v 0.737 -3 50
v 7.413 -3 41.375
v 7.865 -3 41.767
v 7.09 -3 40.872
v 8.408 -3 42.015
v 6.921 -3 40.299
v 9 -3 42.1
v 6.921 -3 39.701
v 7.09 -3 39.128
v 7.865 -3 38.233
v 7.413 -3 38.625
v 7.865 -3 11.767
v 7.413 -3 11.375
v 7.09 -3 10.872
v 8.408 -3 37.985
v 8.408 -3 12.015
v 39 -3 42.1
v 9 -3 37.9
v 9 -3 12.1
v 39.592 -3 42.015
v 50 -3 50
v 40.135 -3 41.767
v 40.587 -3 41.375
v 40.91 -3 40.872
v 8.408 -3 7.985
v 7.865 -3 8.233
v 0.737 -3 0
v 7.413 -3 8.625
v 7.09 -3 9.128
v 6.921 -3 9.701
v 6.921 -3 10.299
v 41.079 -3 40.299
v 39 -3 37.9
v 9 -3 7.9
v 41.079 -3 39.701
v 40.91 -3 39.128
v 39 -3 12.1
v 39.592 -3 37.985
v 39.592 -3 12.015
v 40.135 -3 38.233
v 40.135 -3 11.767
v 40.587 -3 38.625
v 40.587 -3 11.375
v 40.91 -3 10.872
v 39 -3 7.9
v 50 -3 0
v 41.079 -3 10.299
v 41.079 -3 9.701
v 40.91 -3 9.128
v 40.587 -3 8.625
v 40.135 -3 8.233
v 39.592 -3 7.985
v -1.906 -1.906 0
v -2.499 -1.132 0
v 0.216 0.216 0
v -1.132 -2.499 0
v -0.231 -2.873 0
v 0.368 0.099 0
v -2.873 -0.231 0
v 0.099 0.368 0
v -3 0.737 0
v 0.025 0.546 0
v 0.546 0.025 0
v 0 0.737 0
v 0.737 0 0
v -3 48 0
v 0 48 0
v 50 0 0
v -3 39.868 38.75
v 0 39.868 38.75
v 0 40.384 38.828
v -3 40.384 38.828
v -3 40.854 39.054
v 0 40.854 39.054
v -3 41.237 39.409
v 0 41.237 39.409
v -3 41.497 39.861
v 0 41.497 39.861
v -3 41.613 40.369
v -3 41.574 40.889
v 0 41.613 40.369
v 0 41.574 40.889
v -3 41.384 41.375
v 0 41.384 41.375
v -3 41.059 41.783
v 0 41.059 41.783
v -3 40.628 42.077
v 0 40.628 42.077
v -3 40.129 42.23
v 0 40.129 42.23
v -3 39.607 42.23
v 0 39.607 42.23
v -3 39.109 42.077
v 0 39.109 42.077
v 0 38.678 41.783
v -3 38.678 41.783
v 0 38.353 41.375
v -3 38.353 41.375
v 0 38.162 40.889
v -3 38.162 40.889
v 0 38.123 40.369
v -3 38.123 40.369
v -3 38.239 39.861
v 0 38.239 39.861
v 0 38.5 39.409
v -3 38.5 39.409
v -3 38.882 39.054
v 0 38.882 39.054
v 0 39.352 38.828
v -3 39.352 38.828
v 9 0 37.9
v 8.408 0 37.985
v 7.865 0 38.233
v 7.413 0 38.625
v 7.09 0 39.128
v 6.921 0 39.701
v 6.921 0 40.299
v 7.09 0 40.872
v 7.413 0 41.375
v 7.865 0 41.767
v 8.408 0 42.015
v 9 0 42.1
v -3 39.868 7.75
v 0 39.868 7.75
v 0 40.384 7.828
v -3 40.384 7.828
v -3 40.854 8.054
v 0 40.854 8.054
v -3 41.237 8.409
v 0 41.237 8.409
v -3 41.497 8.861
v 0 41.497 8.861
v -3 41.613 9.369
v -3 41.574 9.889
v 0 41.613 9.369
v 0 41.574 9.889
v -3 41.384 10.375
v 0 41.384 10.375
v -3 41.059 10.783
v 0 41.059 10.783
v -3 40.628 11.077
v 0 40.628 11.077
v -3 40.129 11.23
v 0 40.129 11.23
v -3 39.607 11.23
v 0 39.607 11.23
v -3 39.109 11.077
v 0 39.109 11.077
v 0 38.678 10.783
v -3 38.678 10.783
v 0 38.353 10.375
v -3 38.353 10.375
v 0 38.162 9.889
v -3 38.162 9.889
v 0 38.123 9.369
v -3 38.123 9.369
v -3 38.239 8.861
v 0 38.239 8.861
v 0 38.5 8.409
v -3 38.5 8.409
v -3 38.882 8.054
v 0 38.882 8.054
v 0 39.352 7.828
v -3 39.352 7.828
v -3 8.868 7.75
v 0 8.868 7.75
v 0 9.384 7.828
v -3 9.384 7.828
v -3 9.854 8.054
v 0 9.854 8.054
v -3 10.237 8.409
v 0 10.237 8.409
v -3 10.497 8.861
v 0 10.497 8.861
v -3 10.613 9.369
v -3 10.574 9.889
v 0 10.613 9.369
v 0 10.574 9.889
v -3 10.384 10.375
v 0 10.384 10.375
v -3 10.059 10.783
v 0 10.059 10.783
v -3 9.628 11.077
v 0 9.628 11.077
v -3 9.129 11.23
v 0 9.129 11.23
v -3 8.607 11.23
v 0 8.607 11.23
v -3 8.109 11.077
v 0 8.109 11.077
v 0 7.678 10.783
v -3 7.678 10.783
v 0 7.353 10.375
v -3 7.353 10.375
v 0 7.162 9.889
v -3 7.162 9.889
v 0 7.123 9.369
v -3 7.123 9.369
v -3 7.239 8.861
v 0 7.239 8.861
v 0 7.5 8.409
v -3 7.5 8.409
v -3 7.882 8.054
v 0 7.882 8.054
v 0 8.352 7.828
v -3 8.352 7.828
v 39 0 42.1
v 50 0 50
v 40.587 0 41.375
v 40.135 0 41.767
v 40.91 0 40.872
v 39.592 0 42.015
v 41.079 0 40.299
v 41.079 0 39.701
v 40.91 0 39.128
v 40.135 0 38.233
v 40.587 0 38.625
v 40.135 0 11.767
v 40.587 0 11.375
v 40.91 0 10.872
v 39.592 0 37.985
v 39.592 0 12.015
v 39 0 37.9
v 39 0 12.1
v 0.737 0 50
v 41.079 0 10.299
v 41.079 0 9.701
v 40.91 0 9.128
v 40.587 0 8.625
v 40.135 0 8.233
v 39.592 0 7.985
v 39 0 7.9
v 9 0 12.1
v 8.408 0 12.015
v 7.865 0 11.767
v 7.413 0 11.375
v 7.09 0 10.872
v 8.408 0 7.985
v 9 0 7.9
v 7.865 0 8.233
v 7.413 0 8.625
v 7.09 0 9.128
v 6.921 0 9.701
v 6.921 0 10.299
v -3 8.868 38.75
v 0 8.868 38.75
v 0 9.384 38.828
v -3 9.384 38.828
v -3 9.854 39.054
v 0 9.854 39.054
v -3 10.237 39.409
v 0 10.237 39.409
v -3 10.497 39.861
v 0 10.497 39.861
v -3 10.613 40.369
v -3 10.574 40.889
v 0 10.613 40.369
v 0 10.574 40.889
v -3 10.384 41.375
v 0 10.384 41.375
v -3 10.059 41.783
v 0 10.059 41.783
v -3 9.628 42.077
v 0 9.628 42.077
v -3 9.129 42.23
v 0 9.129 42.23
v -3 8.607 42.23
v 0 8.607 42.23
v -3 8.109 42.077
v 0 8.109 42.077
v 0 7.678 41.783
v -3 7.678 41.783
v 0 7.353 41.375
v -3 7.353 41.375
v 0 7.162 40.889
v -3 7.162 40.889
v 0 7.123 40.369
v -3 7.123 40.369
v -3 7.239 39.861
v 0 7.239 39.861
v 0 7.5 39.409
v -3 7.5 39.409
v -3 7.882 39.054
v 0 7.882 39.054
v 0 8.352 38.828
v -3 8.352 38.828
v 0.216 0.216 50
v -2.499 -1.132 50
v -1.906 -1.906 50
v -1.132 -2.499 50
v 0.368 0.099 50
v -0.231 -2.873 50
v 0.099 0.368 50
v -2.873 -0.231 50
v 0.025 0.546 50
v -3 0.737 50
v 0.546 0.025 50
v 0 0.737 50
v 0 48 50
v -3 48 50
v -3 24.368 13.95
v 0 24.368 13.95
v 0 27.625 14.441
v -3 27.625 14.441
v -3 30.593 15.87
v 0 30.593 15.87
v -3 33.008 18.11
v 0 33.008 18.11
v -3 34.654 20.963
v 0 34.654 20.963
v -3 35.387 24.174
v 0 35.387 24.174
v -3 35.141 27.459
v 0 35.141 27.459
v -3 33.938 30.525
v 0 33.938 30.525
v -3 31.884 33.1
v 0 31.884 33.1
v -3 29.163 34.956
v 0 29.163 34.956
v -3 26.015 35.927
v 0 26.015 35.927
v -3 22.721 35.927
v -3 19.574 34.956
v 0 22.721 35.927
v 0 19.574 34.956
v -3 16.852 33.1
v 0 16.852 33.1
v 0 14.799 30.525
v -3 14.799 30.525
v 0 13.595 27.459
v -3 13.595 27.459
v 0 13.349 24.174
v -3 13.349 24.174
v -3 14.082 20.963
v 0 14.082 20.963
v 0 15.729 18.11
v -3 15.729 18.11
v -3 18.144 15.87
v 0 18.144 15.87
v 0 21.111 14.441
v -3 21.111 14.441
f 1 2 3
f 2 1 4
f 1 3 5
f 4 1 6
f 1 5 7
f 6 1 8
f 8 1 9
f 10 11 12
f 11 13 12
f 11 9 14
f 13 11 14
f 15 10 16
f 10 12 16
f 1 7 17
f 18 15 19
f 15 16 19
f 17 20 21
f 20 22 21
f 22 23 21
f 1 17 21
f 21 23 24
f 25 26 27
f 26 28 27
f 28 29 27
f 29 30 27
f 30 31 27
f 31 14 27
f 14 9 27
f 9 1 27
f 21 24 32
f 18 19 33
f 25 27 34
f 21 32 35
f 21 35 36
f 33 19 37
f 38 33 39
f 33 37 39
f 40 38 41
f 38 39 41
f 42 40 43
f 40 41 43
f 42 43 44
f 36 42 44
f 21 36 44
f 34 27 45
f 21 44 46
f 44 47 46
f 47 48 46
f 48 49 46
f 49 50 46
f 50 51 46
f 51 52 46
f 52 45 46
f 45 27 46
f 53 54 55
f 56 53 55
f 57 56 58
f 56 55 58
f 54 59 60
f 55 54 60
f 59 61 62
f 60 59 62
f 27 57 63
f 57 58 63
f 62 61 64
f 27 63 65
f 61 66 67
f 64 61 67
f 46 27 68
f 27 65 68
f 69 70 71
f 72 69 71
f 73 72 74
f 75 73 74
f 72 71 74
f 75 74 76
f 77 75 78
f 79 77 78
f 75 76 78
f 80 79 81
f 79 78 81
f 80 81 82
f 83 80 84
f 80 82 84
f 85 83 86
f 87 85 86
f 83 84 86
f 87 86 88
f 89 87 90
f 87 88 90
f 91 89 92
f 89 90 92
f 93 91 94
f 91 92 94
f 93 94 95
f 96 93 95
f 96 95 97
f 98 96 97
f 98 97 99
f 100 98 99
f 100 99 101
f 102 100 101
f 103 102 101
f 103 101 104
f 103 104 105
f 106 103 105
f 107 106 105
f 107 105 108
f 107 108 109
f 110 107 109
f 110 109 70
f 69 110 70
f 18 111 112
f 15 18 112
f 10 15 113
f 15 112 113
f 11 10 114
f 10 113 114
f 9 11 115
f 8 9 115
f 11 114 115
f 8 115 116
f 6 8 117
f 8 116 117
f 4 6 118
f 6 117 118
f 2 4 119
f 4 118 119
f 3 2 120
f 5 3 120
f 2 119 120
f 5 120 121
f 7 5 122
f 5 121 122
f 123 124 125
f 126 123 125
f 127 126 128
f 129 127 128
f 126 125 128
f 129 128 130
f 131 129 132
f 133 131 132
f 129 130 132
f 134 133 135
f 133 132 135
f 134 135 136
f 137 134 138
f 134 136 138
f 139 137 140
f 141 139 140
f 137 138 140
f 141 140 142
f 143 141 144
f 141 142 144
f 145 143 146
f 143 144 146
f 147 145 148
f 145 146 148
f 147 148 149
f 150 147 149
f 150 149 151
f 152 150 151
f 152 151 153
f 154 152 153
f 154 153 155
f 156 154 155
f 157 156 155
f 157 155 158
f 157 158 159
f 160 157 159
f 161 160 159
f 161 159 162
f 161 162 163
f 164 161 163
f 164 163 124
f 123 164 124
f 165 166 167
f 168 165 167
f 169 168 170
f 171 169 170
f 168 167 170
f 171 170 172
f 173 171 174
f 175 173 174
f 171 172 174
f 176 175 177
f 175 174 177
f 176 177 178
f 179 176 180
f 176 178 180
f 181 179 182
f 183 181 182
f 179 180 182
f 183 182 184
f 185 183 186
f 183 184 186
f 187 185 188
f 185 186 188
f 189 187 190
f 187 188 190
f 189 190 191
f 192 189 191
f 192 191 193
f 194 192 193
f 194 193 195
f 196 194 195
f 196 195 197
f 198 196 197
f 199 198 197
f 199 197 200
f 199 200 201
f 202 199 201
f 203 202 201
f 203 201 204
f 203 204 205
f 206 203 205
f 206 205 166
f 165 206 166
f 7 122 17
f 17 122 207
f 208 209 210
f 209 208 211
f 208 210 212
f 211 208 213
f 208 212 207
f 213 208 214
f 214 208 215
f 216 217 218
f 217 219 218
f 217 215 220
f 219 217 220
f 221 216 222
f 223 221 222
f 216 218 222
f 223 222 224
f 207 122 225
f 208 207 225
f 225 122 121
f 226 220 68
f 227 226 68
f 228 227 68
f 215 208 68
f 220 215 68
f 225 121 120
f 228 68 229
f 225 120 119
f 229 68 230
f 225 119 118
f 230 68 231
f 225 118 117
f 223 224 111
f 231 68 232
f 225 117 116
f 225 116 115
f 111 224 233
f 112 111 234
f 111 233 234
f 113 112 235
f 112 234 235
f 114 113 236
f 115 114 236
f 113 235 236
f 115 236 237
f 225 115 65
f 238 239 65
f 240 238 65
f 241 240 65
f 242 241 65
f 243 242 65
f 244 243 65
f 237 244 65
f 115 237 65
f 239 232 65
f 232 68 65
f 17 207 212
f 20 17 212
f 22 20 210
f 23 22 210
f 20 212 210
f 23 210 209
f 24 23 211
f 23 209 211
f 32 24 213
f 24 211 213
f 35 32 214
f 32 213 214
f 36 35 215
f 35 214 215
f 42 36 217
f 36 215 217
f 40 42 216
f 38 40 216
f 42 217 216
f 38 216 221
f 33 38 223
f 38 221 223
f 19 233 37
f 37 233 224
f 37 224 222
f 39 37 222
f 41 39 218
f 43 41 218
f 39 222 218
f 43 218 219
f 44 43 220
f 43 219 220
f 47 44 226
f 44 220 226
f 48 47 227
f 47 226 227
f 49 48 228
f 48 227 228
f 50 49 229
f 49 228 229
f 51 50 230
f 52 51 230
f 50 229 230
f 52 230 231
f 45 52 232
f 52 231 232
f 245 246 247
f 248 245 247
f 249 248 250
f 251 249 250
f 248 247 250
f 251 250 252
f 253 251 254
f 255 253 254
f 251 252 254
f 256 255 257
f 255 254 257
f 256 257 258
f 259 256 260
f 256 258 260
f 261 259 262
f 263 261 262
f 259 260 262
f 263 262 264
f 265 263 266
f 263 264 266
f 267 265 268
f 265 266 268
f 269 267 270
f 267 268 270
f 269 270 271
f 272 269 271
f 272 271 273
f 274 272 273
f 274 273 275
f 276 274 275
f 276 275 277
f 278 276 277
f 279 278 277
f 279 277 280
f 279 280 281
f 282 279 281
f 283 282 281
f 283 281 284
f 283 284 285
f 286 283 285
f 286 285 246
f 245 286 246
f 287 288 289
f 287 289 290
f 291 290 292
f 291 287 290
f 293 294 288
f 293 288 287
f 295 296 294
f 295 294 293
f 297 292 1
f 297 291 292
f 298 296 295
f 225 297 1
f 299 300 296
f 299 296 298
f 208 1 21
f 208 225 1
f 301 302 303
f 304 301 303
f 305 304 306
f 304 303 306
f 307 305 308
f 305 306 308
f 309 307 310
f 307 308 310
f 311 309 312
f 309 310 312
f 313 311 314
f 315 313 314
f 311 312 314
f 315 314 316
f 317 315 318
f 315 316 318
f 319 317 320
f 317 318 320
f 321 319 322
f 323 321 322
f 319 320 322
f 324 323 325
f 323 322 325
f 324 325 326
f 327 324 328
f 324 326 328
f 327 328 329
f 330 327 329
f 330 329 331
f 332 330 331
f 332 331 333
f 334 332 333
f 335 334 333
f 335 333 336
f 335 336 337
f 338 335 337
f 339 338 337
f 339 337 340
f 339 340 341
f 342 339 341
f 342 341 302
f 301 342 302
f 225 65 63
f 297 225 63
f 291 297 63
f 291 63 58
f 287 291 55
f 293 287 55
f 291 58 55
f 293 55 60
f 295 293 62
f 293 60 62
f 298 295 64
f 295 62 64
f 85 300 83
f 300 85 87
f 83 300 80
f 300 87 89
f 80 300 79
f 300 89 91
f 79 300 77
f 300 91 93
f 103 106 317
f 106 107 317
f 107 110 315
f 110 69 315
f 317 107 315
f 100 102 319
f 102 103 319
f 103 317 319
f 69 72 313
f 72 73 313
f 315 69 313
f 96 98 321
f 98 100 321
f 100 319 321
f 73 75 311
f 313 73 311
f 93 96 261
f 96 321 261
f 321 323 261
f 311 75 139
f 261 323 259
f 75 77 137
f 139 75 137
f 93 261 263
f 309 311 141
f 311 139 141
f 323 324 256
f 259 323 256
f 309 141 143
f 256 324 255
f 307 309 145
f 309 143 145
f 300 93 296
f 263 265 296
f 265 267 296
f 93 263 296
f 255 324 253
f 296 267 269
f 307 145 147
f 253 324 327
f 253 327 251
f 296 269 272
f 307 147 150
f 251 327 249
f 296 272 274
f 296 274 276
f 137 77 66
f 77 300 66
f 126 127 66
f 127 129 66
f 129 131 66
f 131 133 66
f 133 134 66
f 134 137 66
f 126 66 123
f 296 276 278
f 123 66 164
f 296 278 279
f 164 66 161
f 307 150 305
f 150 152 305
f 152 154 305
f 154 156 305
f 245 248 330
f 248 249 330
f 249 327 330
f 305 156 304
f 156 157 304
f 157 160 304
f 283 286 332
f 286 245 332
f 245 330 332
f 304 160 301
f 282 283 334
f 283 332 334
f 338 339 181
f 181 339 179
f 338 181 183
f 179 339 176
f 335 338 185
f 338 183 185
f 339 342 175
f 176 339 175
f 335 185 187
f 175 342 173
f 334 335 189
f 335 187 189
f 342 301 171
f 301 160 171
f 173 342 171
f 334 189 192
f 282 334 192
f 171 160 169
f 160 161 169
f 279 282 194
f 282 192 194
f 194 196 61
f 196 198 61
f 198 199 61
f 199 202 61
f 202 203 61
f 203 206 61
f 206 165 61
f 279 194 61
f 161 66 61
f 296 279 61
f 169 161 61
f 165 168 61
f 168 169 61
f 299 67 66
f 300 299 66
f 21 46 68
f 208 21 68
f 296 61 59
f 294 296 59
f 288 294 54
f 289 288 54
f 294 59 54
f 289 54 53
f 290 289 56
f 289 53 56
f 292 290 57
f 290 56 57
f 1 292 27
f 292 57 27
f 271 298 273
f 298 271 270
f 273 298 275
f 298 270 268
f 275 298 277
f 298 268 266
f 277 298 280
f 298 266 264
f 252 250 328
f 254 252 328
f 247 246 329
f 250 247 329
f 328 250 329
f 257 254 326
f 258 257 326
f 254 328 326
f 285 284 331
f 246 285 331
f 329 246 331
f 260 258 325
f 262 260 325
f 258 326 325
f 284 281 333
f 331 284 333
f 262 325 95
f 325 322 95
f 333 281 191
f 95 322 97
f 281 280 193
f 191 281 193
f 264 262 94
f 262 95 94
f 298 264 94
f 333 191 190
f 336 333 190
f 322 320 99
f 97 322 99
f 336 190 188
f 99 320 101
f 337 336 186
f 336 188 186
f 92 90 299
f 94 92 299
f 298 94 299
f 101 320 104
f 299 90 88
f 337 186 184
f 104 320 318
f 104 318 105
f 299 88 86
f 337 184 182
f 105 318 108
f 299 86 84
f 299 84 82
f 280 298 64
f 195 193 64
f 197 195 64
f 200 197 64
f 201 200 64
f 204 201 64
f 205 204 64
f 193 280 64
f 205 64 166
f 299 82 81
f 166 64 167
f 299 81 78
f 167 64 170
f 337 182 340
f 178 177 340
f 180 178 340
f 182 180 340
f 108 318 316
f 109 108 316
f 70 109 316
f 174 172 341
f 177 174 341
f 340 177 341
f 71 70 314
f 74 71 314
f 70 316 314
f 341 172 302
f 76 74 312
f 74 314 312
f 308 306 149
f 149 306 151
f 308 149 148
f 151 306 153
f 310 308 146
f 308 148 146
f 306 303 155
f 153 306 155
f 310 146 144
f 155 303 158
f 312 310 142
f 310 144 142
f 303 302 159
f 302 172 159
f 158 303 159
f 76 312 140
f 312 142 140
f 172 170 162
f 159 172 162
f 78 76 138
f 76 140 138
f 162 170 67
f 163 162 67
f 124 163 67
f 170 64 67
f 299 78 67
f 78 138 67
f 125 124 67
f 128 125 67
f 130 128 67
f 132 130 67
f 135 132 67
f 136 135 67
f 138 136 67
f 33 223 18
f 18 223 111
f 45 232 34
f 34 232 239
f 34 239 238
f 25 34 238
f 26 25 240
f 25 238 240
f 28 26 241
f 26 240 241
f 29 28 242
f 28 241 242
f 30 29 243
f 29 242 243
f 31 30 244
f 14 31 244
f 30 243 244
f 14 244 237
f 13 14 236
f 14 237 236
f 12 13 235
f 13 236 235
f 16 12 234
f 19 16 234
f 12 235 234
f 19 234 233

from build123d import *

# Parameters (mm, degrees)
SM_BASE_FLANGE_1_DEPTH = 50
SKETCH_7_R             = 11.05
SKETCH_7_R_2           = 1.75
CUT_EXTRUDE_1_DEPTH    = 10
CUT_EXTRUDE_2_DEPTH    = 10


# Sheet-metal steps are written as plain solids
with BuildPart() as part:
    # Sketch 2 → 基体-法兰1 (new body)
    with BuildSketch(Plane.XY):
        with BuildLine():
            Line((50, 0), (0.7366, 0))
            ThreePointArc((0.7366, 0), (0.215745145, 0.215745145), (0, 0.7366))
            Line((0, 0.7366), (0, 48))
            Line((0, 48), (-3, 48))
            Line((-3, 48), (-3, 0.7366))
            ThreePointArc((-3, 0.7366), (-1.905575199, -1.905575199), (0.7366, -3))
            Line((0.7366, -3), (50, -3))
            Line((50, -3), (50, 0))
        make_face()
    extrude(amount=SM_BASE_FLANGE_1_DEPTH)

    # 草图7 → 切除-拉伸1 (cut)
    with BuildSketch(Plane(origin=(0, 0, 0), x_dir=(0, 0, -1), z_dir=(1, 0, 0))):
        with Locations((-25, 24.3683)):
            Circle(SKETCH_7_R)
        with Locations((-40.5, 39.8683)):
            Circle(SKETCH_7_R_2)
        with Locations((-9.5, 39.8683)):
            Circle(SKETCH_7_R_2)
        with Locations((-40.5, 8.8683)):
            Circle(SKETCH_7_R_2)
        with Locations((-9.5, 8.8683)):
            Circle(SKETCH_7_R_2)
    extrude(amount=-CUT_EXTRUDE_1_DEPTH, mode=Mode.SUBTRACT)

    # 草图8 → 切除-拉伸2 (cut)
    with BuildSketch(Plane(origin=(0, 0, 0), x_dir=(1, 0, 0), z_dir=(0, 1, 0))):
        with BuildLine():
            Line((9, -12.1), (39, -12.1))
            ThreePointArc((39, -12.1), (41.1, -10), (39, -7.9))
            Line((39, -7.9), (9, -7.9))
            ThreePointArc((9, -7.9), (6.9, -10), (9, -12.1))
        make_face()
        with BuildLine():
            Line((9, -42.1), (39, -42.1))
            ThreePointArc((39, -42.1), (41.1, -40), (39, -37.9))
            Line((39, -37.9), (9, -37.9))
            ThreePointArc((9, -37.9), (6.9, -40), (9, -42.1))
        make_face()
    extrude(amount=-CUT_EXTRUDE_2_DEPTH, mode=Mode.SUBTRACT)


solid = part.part
